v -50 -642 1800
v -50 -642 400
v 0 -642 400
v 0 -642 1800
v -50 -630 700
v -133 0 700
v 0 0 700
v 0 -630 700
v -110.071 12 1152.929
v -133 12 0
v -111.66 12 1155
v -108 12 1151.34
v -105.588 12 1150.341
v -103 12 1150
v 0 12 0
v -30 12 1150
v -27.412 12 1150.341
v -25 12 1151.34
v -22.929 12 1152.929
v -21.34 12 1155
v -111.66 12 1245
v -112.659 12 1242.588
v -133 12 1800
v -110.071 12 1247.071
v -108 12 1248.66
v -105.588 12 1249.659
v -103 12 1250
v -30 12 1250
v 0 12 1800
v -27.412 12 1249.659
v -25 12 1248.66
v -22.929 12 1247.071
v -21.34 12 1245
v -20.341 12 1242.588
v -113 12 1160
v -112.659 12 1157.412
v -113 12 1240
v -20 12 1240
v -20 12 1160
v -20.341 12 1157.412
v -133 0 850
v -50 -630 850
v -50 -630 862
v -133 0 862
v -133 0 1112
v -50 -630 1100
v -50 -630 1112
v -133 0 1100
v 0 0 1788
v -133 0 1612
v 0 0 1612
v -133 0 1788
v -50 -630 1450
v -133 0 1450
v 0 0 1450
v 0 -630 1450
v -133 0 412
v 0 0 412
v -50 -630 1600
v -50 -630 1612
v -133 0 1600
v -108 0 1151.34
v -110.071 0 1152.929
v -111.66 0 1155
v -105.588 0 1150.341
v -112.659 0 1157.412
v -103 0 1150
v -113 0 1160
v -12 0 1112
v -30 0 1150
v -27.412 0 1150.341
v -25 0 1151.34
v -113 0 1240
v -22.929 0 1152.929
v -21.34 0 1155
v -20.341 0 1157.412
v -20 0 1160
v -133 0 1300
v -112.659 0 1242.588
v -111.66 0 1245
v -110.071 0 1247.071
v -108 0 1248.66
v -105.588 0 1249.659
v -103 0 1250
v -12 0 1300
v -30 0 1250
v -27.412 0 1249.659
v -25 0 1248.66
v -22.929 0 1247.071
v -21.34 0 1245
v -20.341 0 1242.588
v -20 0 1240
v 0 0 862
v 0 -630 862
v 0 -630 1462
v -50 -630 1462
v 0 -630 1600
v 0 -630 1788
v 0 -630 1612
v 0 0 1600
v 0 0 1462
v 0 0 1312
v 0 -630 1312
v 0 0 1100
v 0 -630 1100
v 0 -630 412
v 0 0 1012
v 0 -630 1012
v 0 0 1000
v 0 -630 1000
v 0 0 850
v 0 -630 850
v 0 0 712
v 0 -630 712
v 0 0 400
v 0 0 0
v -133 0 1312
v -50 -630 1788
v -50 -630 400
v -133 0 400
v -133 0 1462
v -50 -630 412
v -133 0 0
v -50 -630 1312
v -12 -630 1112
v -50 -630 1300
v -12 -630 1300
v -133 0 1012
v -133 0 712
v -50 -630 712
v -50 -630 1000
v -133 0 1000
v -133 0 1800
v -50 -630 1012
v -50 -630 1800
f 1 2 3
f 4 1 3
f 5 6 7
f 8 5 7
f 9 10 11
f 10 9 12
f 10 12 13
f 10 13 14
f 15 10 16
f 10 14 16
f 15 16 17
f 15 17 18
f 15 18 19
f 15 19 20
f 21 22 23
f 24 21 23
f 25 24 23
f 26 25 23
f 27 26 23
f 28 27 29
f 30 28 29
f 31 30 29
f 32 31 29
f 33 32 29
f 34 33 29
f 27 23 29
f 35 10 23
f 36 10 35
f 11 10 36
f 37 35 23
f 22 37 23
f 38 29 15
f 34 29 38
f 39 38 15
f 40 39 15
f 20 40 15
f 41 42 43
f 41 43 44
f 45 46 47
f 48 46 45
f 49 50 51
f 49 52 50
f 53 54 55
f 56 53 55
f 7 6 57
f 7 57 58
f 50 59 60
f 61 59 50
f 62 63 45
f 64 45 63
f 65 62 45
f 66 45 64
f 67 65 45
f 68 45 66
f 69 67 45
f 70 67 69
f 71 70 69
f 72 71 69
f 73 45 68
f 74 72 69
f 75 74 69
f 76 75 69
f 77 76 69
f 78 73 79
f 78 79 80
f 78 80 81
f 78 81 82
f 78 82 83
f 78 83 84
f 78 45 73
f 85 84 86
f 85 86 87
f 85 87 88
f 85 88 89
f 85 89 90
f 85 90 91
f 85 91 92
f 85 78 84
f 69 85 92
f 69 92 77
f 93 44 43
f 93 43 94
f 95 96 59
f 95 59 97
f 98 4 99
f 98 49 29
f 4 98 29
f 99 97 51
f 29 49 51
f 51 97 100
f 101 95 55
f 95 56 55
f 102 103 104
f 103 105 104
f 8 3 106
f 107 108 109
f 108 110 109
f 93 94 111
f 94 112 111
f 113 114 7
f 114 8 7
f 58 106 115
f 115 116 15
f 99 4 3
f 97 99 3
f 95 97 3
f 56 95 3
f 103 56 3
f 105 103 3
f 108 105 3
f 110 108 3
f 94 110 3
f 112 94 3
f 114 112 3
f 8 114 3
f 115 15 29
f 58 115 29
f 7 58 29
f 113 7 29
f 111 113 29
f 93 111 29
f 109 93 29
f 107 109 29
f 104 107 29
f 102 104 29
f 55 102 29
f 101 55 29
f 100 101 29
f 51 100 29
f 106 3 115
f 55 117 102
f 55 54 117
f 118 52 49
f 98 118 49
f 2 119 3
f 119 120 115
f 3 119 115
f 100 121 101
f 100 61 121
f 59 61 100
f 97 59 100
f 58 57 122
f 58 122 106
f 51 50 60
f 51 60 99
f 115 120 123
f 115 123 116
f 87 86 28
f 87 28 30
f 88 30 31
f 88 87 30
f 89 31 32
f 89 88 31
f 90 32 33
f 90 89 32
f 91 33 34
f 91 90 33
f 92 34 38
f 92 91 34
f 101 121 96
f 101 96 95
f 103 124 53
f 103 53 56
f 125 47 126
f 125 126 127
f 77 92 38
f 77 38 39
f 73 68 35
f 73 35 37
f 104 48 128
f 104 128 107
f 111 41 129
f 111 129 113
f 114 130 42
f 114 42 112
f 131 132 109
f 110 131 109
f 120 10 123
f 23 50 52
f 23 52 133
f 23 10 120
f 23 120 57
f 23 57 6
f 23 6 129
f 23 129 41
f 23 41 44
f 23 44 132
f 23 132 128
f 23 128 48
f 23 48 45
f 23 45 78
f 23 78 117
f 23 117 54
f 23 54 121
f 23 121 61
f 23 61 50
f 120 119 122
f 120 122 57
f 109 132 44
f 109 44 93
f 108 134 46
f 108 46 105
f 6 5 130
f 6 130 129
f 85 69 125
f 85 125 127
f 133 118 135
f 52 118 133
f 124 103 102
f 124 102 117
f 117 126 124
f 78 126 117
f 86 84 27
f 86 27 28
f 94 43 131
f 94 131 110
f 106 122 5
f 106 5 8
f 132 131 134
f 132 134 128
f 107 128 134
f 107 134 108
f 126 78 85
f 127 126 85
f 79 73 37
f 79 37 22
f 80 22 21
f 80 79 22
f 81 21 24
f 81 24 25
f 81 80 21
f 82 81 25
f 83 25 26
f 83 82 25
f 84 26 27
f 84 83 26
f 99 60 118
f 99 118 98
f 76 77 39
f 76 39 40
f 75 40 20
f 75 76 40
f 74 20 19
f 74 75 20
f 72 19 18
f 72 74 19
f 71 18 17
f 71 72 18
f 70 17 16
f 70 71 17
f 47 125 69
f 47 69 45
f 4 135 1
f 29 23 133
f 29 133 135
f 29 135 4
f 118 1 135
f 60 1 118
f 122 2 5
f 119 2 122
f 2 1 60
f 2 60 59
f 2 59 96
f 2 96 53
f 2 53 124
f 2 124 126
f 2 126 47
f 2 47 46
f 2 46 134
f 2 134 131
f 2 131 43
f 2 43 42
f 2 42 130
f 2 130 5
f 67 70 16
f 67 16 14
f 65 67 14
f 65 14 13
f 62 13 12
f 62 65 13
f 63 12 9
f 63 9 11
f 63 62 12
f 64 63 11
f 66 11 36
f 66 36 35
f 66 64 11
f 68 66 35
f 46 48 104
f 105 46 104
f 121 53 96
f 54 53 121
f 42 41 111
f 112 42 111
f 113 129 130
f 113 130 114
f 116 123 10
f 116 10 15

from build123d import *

# Parameters (mm, degrees)
F0_W     = 133
F0_H     = 1800
F2_DEPTH = 12
F3_W     = 133
F3_H     = 12
F3_W_2   = 12
F3_H_2   = 188
F4_DEPTH = 630
F5_DEPTH = 1800.001
F6_START = 400
F1_W     = 50
F1_H     = 12
F6_DEPTH = 1400


with BuildPart() as f2:
    # F0 (on Front) → F2 (new body)
    with BuildSketch(Plane.XZ):
        with Locations((-66.5, 900)):
            Rectangle(F0_W, F0_H)
        with BuildLine():
            Line((-30, 1150), (-103, 1150))
            ThreePointArc((-103, 1150), (-110.0710678119, 1152.9289321881), (-113, 1160))
            Line((-113, 1160), (-113, 1240))
            ThreePointArc((-113, 1240), (-110.0710678119, 1247.0710678119), (-103, 1250))
            Line((-103, 1250), (-30, 1250))
            ThreePointArc((-30, 1250), (-22.9289321881, 1247.0710678119), (-20, 1240))
            Line((-20, 1240), (-20, 1160))
            ThreePointArc((-20, 1160), (-22.9289321881, 1152.9289321881), (-30, 1150))
        make_face(mode=Mode.SUBTRACT)
    extrude(amount=-F2_DEPTH)

    # F3 (on face) → F4 (join)
    with BuildSketch(Plane.XZ):
        with Locations((-66.5, 406)):
            Rectangle(F3_W, F3_H)
        with Locations((-66.5, 856)):
            Rectangle(F3_W, F3_H)
        with Locations((-66.5, 706)):
            Rectangle(F3_W, F3_H)
        with Locations((-66.5, 1006)):
            Rectangle(F3_W, F3_H)
        with Locations((-6, 1206)):
            Rectangle(F3_W_2, F3_H_2)
        Polygon((-12, 1300), (0, 1300), (0, 1312), (-133, 1312), (-133, 1300), align=None)
        Polygon((0, 1100), (0, 1112), (-12, 1112), (-133, 1112), (-133, 1100), align=None)
        with Locations((-66.5, 1456)):
            Rectangle(F3_W, F3_H)
        with Locations((-66.5, 1606)):
            Rectangle(F3_W, F3_H)
        with Locations((-66.5, 1794)):
            Rectangle(F3_W, F3_H)
    extrude(amount=F4_DEPTH)

    # F1 (on Top) → F5 (cut, through all)
    with BuildSketch(Plane.XY):
        Polygon((-50, -630), (-133, 0), (-133, -630), align=None)
    extrude(amount=F5_DEPTH, mode=Mode.SUBTRACT)

    # F1 (on Top) → F6 (join)
    with BuildSketch(Plane.XY.offset(F6_START)):
        with Locations((-25, -636)):
            Rectangle(F1_W, F1_H)
    extrude(amount=F6_DEPTH)


with BuildPart() as f7_1:
    # F7: copy of F2
    add(f2.part)


solid = f2.part
